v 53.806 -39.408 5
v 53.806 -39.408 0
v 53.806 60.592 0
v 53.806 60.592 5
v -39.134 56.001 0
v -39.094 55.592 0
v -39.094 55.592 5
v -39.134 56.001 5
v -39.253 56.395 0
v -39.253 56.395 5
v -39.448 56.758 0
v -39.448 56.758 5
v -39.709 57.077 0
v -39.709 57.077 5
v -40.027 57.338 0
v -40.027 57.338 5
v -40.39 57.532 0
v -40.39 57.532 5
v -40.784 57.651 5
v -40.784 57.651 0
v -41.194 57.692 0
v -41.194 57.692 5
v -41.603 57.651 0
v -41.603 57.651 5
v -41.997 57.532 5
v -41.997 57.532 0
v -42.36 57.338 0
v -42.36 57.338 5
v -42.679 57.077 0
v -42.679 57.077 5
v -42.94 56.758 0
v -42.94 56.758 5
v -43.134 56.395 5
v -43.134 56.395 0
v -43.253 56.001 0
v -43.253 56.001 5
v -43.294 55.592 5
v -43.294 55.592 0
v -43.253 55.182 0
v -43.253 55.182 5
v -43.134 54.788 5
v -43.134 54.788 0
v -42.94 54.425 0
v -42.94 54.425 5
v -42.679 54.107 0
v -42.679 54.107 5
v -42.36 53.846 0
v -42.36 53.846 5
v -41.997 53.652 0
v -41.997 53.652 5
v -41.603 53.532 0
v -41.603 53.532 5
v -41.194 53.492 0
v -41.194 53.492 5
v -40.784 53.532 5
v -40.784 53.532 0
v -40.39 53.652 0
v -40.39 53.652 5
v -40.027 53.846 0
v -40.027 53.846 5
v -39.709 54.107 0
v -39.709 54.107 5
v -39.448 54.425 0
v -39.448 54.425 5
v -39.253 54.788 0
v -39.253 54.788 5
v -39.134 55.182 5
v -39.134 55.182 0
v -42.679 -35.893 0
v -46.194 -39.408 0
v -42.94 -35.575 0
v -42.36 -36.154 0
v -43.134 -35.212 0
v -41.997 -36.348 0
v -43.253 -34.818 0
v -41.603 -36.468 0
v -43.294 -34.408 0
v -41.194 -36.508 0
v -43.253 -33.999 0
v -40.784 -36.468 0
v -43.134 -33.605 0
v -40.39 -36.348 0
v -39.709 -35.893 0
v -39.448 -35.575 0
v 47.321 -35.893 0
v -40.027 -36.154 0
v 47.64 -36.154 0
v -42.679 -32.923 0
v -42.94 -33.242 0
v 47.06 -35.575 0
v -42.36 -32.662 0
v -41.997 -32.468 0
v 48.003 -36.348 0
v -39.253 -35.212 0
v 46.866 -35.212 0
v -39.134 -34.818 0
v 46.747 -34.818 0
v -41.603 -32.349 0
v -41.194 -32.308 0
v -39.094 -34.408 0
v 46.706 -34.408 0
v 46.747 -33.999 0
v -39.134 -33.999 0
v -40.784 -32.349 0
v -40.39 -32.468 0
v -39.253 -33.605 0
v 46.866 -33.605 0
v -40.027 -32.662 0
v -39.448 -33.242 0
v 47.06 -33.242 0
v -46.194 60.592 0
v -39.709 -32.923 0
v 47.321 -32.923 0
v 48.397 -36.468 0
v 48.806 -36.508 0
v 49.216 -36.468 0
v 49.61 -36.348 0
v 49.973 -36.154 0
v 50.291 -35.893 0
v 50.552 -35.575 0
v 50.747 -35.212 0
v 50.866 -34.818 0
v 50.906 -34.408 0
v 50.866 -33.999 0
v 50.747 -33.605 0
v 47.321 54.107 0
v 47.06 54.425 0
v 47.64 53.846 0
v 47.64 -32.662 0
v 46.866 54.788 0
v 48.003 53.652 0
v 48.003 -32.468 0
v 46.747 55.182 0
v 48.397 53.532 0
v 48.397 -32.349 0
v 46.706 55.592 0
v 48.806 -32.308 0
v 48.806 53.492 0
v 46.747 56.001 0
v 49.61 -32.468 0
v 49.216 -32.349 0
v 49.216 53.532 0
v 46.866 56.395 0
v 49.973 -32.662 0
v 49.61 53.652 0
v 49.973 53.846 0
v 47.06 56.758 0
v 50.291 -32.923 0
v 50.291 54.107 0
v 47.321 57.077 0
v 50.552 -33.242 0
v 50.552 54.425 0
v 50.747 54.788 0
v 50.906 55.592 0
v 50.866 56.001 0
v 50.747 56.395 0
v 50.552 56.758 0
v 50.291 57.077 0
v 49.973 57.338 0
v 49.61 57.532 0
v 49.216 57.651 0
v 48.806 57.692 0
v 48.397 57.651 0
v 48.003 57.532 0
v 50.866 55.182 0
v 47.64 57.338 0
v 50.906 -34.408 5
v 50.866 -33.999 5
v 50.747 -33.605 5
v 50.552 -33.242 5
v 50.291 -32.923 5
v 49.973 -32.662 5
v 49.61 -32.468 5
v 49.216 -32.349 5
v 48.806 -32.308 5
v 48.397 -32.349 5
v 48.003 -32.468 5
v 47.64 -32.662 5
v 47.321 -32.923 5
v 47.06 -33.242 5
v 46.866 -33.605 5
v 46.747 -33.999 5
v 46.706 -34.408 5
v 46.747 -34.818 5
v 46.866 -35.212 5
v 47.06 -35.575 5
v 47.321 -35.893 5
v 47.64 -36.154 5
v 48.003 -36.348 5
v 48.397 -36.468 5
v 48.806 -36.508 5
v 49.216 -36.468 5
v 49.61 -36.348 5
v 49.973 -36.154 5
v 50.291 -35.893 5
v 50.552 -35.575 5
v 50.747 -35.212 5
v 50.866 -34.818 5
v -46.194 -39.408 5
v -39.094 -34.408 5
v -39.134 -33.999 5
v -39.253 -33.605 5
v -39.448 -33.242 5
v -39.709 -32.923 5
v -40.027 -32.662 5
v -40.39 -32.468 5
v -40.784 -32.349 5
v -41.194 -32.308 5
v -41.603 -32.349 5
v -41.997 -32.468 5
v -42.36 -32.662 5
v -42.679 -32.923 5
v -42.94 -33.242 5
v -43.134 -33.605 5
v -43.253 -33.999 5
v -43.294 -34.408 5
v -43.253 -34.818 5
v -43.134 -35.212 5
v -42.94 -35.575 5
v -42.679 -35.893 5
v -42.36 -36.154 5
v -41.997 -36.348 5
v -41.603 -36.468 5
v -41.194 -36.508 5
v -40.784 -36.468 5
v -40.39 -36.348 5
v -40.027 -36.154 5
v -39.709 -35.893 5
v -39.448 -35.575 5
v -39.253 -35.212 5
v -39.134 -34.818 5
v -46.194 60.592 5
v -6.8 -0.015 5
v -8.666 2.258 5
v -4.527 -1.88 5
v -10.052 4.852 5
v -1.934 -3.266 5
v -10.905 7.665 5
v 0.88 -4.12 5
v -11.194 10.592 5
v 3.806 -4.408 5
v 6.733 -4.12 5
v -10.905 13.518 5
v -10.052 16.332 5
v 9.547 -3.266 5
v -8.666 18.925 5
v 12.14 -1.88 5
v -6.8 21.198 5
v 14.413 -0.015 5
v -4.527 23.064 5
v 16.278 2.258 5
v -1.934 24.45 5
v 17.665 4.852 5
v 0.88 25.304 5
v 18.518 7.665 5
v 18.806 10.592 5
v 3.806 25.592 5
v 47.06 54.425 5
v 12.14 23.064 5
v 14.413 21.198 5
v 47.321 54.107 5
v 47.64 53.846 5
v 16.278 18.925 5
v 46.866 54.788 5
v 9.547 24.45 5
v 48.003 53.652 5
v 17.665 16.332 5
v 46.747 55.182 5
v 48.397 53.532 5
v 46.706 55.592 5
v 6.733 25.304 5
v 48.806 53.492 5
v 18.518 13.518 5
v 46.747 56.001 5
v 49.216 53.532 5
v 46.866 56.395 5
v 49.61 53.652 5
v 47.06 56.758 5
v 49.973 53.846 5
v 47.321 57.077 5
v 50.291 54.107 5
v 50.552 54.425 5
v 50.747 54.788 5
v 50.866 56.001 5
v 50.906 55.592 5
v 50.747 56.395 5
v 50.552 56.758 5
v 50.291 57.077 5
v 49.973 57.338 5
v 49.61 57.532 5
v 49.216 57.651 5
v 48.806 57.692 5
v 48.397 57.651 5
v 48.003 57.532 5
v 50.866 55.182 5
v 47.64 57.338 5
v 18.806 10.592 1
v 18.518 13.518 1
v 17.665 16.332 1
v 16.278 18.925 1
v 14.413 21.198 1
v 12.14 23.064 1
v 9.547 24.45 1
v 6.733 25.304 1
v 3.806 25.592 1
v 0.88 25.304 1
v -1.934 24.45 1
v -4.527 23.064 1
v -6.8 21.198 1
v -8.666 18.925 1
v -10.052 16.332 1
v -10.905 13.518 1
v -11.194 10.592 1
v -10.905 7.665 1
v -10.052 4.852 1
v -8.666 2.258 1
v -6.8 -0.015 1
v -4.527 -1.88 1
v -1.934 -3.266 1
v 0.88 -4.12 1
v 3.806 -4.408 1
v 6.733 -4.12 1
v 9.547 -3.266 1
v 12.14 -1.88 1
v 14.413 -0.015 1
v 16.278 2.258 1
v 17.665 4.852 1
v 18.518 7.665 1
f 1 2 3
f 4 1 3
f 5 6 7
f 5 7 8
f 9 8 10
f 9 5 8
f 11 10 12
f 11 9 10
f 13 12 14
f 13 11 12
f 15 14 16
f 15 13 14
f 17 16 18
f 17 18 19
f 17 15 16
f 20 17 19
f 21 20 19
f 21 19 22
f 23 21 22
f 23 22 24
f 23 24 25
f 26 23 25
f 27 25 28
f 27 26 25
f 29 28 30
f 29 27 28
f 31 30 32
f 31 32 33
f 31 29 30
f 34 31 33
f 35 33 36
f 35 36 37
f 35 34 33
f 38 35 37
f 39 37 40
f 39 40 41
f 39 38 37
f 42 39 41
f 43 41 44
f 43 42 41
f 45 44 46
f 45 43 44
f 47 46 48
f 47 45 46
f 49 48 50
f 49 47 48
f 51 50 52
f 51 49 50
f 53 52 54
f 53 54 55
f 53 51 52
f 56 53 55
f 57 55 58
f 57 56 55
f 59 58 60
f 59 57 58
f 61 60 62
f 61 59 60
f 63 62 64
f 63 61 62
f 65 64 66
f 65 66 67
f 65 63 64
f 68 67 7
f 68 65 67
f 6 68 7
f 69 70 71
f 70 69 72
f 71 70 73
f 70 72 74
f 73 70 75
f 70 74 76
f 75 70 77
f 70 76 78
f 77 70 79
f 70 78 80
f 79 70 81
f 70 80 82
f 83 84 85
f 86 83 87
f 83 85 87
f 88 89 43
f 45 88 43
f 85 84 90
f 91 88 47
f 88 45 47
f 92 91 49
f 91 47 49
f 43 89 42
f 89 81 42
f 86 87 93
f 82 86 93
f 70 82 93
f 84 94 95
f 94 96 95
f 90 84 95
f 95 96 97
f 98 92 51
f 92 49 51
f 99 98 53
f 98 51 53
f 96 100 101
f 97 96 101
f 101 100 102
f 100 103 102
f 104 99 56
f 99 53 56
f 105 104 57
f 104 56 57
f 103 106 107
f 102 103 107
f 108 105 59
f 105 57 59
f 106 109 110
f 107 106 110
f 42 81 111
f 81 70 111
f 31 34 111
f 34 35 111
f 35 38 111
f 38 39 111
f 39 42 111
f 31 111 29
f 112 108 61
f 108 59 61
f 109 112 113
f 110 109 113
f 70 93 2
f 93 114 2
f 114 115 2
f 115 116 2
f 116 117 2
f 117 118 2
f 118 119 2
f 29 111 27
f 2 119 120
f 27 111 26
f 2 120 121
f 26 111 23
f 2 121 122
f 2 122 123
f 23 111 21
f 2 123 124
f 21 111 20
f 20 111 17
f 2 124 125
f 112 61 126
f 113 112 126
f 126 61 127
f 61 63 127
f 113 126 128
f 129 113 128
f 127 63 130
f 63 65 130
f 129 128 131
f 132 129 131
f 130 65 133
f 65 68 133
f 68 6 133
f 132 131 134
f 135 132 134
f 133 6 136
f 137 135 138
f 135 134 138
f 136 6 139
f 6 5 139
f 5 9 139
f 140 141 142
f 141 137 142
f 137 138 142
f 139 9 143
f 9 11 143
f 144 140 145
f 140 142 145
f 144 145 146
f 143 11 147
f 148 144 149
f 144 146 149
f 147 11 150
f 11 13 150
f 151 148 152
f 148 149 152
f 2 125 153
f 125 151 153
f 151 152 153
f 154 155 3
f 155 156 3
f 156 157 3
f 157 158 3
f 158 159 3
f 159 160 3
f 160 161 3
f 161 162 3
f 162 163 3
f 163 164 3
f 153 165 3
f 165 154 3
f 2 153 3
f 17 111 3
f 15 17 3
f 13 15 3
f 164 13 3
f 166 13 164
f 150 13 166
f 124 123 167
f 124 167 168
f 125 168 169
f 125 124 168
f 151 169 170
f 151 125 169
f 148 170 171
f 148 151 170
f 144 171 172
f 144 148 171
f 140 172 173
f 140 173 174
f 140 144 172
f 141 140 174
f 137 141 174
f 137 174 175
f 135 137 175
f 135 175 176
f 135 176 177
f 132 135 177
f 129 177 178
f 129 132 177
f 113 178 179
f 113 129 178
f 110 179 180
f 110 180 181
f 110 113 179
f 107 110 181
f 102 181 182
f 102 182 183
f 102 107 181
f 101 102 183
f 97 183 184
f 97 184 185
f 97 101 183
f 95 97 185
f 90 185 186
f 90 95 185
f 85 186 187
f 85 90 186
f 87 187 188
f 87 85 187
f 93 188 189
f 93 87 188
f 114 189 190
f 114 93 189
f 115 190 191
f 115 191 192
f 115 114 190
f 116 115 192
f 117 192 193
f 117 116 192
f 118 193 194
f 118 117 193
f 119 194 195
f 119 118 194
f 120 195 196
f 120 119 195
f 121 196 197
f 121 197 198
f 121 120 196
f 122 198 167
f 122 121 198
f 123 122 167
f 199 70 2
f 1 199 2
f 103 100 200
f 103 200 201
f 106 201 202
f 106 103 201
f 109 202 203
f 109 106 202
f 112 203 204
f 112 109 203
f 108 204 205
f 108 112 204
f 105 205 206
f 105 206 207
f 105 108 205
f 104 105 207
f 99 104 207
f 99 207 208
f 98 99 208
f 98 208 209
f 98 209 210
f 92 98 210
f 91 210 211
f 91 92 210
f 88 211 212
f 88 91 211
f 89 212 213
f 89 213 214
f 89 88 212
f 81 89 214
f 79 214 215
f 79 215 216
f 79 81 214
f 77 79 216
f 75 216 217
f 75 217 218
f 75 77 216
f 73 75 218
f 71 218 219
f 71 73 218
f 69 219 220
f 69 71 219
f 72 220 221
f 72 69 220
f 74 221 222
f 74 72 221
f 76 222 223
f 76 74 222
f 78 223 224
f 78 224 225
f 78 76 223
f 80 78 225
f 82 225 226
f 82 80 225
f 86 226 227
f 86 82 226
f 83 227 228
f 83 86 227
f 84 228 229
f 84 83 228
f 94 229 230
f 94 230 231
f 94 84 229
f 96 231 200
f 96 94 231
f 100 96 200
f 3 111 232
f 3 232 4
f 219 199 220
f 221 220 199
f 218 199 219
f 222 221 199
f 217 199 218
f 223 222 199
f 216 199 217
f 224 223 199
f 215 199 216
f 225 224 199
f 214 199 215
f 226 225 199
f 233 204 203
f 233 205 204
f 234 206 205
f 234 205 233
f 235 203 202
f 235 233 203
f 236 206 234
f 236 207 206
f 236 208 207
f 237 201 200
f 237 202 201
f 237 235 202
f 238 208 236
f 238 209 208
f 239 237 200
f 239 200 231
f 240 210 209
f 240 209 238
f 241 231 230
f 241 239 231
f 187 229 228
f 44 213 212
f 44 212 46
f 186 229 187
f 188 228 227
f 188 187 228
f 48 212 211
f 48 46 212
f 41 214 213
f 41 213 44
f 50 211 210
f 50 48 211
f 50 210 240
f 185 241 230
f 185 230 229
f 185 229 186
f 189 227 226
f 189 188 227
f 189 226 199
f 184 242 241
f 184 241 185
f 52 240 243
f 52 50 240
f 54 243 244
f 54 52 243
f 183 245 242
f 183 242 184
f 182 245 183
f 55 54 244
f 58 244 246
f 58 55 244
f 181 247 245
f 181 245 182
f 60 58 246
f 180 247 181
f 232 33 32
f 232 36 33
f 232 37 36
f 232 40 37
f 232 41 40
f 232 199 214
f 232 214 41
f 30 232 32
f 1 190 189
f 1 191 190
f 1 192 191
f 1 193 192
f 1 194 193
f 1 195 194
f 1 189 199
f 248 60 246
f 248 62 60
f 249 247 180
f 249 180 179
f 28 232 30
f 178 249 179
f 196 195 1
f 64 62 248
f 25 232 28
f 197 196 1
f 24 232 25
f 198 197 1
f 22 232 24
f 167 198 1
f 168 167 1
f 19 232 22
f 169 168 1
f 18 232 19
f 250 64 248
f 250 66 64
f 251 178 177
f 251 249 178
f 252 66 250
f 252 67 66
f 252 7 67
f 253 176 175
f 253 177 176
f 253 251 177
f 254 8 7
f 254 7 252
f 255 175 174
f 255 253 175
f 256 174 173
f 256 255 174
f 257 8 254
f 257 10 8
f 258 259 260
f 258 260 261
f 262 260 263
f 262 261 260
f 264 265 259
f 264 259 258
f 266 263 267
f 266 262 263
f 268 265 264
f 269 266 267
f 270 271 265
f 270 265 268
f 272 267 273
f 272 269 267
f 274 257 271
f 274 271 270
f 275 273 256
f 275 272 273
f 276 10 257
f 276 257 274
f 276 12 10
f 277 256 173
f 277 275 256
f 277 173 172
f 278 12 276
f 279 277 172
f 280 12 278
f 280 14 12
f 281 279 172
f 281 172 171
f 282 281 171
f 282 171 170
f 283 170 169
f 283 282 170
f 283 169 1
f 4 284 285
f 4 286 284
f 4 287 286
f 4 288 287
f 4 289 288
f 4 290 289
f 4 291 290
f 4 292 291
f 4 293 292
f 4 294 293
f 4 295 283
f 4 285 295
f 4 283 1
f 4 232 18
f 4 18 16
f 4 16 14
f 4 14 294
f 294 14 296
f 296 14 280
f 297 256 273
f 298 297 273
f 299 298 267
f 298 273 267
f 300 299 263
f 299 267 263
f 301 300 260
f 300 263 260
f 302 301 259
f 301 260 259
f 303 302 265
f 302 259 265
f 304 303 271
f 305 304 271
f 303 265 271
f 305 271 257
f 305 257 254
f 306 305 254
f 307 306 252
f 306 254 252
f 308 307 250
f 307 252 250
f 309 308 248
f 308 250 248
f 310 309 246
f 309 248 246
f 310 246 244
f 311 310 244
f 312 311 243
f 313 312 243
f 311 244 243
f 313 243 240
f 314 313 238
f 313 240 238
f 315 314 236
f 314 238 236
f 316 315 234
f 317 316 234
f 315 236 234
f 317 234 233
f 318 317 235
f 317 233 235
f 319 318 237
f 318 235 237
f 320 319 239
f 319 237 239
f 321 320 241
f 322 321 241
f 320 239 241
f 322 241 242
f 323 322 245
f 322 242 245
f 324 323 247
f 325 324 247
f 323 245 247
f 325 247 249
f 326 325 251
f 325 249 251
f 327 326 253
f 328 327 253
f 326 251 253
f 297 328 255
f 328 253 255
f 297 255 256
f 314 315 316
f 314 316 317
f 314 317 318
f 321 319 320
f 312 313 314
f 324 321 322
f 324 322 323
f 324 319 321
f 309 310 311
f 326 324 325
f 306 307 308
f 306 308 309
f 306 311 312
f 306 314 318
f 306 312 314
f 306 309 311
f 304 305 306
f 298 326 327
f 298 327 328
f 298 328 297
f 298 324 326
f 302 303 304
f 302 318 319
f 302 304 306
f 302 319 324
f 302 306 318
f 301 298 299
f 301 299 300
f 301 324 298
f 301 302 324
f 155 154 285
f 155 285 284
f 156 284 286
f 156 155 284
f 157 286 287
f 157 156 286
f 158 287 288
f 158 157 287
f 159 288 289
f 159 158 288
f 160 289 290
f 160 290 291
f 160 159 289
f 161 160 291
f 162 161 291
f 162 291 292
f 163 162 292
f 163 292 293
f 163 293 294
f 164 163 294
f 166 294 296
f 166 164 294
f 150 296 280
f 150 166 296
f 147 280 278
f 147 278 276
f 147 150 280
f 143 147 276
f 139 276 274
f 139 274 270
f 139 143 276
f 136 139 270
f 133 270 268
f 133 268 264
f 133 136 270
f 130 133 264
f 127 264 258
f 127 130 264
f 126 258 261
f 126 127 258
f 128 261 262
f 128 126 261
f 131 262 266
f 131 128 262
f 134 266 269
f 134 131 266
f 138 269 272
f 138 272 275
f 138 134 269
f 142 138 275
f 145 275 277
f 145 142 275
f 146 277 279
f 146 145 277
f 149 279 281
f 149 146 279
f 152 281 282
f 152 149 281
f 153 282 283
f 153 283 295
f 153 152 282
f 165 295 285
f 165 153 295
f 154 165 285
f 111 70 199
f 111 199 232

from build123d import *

# Parameters (mm, degrees)
F0_W     = 100
F0_H     = 100
F0_R     = 2.1
F1_DEPTH = 5
F2_R     = 15
F3_DEPTH = 4


with BuildPart() as f1:
    # F0 (on Top) → F1 (new body)
    with BuildSketch(Plane.XY):
        with Locations((3.806381, 10.591754)):
            Rectangle(F0_W, F0_H)
        with Locations((-41.193619, -34.408246)):
            Circle(F0_R, mode=Mode.SUBTRACT)
        with Locations((48.806381, -34.408246)):
            Circle(F0_R, mode=Mode.SUBTRACT)
        with Locations((-41.193619, 55.591754)):
            Circle(F0_R, mode=Mode.SUBTRACT)
        with Locations((48.806381, 55.591754)):
            Circle(F0_R, mode=Mode.SUBTRACT)
    extrude(amount=F1_DEPTH)

    # F2 (on face) → F3 (cut)
    with BuildSketch(Plane.XY.offset(5)):
        with Locations((3.806381, 10.591754)):
            Circle(F2_R)
    extrude(amount=-F3_DEPTH, mode=Mode.SUBTRACT)


solid = f1.part
